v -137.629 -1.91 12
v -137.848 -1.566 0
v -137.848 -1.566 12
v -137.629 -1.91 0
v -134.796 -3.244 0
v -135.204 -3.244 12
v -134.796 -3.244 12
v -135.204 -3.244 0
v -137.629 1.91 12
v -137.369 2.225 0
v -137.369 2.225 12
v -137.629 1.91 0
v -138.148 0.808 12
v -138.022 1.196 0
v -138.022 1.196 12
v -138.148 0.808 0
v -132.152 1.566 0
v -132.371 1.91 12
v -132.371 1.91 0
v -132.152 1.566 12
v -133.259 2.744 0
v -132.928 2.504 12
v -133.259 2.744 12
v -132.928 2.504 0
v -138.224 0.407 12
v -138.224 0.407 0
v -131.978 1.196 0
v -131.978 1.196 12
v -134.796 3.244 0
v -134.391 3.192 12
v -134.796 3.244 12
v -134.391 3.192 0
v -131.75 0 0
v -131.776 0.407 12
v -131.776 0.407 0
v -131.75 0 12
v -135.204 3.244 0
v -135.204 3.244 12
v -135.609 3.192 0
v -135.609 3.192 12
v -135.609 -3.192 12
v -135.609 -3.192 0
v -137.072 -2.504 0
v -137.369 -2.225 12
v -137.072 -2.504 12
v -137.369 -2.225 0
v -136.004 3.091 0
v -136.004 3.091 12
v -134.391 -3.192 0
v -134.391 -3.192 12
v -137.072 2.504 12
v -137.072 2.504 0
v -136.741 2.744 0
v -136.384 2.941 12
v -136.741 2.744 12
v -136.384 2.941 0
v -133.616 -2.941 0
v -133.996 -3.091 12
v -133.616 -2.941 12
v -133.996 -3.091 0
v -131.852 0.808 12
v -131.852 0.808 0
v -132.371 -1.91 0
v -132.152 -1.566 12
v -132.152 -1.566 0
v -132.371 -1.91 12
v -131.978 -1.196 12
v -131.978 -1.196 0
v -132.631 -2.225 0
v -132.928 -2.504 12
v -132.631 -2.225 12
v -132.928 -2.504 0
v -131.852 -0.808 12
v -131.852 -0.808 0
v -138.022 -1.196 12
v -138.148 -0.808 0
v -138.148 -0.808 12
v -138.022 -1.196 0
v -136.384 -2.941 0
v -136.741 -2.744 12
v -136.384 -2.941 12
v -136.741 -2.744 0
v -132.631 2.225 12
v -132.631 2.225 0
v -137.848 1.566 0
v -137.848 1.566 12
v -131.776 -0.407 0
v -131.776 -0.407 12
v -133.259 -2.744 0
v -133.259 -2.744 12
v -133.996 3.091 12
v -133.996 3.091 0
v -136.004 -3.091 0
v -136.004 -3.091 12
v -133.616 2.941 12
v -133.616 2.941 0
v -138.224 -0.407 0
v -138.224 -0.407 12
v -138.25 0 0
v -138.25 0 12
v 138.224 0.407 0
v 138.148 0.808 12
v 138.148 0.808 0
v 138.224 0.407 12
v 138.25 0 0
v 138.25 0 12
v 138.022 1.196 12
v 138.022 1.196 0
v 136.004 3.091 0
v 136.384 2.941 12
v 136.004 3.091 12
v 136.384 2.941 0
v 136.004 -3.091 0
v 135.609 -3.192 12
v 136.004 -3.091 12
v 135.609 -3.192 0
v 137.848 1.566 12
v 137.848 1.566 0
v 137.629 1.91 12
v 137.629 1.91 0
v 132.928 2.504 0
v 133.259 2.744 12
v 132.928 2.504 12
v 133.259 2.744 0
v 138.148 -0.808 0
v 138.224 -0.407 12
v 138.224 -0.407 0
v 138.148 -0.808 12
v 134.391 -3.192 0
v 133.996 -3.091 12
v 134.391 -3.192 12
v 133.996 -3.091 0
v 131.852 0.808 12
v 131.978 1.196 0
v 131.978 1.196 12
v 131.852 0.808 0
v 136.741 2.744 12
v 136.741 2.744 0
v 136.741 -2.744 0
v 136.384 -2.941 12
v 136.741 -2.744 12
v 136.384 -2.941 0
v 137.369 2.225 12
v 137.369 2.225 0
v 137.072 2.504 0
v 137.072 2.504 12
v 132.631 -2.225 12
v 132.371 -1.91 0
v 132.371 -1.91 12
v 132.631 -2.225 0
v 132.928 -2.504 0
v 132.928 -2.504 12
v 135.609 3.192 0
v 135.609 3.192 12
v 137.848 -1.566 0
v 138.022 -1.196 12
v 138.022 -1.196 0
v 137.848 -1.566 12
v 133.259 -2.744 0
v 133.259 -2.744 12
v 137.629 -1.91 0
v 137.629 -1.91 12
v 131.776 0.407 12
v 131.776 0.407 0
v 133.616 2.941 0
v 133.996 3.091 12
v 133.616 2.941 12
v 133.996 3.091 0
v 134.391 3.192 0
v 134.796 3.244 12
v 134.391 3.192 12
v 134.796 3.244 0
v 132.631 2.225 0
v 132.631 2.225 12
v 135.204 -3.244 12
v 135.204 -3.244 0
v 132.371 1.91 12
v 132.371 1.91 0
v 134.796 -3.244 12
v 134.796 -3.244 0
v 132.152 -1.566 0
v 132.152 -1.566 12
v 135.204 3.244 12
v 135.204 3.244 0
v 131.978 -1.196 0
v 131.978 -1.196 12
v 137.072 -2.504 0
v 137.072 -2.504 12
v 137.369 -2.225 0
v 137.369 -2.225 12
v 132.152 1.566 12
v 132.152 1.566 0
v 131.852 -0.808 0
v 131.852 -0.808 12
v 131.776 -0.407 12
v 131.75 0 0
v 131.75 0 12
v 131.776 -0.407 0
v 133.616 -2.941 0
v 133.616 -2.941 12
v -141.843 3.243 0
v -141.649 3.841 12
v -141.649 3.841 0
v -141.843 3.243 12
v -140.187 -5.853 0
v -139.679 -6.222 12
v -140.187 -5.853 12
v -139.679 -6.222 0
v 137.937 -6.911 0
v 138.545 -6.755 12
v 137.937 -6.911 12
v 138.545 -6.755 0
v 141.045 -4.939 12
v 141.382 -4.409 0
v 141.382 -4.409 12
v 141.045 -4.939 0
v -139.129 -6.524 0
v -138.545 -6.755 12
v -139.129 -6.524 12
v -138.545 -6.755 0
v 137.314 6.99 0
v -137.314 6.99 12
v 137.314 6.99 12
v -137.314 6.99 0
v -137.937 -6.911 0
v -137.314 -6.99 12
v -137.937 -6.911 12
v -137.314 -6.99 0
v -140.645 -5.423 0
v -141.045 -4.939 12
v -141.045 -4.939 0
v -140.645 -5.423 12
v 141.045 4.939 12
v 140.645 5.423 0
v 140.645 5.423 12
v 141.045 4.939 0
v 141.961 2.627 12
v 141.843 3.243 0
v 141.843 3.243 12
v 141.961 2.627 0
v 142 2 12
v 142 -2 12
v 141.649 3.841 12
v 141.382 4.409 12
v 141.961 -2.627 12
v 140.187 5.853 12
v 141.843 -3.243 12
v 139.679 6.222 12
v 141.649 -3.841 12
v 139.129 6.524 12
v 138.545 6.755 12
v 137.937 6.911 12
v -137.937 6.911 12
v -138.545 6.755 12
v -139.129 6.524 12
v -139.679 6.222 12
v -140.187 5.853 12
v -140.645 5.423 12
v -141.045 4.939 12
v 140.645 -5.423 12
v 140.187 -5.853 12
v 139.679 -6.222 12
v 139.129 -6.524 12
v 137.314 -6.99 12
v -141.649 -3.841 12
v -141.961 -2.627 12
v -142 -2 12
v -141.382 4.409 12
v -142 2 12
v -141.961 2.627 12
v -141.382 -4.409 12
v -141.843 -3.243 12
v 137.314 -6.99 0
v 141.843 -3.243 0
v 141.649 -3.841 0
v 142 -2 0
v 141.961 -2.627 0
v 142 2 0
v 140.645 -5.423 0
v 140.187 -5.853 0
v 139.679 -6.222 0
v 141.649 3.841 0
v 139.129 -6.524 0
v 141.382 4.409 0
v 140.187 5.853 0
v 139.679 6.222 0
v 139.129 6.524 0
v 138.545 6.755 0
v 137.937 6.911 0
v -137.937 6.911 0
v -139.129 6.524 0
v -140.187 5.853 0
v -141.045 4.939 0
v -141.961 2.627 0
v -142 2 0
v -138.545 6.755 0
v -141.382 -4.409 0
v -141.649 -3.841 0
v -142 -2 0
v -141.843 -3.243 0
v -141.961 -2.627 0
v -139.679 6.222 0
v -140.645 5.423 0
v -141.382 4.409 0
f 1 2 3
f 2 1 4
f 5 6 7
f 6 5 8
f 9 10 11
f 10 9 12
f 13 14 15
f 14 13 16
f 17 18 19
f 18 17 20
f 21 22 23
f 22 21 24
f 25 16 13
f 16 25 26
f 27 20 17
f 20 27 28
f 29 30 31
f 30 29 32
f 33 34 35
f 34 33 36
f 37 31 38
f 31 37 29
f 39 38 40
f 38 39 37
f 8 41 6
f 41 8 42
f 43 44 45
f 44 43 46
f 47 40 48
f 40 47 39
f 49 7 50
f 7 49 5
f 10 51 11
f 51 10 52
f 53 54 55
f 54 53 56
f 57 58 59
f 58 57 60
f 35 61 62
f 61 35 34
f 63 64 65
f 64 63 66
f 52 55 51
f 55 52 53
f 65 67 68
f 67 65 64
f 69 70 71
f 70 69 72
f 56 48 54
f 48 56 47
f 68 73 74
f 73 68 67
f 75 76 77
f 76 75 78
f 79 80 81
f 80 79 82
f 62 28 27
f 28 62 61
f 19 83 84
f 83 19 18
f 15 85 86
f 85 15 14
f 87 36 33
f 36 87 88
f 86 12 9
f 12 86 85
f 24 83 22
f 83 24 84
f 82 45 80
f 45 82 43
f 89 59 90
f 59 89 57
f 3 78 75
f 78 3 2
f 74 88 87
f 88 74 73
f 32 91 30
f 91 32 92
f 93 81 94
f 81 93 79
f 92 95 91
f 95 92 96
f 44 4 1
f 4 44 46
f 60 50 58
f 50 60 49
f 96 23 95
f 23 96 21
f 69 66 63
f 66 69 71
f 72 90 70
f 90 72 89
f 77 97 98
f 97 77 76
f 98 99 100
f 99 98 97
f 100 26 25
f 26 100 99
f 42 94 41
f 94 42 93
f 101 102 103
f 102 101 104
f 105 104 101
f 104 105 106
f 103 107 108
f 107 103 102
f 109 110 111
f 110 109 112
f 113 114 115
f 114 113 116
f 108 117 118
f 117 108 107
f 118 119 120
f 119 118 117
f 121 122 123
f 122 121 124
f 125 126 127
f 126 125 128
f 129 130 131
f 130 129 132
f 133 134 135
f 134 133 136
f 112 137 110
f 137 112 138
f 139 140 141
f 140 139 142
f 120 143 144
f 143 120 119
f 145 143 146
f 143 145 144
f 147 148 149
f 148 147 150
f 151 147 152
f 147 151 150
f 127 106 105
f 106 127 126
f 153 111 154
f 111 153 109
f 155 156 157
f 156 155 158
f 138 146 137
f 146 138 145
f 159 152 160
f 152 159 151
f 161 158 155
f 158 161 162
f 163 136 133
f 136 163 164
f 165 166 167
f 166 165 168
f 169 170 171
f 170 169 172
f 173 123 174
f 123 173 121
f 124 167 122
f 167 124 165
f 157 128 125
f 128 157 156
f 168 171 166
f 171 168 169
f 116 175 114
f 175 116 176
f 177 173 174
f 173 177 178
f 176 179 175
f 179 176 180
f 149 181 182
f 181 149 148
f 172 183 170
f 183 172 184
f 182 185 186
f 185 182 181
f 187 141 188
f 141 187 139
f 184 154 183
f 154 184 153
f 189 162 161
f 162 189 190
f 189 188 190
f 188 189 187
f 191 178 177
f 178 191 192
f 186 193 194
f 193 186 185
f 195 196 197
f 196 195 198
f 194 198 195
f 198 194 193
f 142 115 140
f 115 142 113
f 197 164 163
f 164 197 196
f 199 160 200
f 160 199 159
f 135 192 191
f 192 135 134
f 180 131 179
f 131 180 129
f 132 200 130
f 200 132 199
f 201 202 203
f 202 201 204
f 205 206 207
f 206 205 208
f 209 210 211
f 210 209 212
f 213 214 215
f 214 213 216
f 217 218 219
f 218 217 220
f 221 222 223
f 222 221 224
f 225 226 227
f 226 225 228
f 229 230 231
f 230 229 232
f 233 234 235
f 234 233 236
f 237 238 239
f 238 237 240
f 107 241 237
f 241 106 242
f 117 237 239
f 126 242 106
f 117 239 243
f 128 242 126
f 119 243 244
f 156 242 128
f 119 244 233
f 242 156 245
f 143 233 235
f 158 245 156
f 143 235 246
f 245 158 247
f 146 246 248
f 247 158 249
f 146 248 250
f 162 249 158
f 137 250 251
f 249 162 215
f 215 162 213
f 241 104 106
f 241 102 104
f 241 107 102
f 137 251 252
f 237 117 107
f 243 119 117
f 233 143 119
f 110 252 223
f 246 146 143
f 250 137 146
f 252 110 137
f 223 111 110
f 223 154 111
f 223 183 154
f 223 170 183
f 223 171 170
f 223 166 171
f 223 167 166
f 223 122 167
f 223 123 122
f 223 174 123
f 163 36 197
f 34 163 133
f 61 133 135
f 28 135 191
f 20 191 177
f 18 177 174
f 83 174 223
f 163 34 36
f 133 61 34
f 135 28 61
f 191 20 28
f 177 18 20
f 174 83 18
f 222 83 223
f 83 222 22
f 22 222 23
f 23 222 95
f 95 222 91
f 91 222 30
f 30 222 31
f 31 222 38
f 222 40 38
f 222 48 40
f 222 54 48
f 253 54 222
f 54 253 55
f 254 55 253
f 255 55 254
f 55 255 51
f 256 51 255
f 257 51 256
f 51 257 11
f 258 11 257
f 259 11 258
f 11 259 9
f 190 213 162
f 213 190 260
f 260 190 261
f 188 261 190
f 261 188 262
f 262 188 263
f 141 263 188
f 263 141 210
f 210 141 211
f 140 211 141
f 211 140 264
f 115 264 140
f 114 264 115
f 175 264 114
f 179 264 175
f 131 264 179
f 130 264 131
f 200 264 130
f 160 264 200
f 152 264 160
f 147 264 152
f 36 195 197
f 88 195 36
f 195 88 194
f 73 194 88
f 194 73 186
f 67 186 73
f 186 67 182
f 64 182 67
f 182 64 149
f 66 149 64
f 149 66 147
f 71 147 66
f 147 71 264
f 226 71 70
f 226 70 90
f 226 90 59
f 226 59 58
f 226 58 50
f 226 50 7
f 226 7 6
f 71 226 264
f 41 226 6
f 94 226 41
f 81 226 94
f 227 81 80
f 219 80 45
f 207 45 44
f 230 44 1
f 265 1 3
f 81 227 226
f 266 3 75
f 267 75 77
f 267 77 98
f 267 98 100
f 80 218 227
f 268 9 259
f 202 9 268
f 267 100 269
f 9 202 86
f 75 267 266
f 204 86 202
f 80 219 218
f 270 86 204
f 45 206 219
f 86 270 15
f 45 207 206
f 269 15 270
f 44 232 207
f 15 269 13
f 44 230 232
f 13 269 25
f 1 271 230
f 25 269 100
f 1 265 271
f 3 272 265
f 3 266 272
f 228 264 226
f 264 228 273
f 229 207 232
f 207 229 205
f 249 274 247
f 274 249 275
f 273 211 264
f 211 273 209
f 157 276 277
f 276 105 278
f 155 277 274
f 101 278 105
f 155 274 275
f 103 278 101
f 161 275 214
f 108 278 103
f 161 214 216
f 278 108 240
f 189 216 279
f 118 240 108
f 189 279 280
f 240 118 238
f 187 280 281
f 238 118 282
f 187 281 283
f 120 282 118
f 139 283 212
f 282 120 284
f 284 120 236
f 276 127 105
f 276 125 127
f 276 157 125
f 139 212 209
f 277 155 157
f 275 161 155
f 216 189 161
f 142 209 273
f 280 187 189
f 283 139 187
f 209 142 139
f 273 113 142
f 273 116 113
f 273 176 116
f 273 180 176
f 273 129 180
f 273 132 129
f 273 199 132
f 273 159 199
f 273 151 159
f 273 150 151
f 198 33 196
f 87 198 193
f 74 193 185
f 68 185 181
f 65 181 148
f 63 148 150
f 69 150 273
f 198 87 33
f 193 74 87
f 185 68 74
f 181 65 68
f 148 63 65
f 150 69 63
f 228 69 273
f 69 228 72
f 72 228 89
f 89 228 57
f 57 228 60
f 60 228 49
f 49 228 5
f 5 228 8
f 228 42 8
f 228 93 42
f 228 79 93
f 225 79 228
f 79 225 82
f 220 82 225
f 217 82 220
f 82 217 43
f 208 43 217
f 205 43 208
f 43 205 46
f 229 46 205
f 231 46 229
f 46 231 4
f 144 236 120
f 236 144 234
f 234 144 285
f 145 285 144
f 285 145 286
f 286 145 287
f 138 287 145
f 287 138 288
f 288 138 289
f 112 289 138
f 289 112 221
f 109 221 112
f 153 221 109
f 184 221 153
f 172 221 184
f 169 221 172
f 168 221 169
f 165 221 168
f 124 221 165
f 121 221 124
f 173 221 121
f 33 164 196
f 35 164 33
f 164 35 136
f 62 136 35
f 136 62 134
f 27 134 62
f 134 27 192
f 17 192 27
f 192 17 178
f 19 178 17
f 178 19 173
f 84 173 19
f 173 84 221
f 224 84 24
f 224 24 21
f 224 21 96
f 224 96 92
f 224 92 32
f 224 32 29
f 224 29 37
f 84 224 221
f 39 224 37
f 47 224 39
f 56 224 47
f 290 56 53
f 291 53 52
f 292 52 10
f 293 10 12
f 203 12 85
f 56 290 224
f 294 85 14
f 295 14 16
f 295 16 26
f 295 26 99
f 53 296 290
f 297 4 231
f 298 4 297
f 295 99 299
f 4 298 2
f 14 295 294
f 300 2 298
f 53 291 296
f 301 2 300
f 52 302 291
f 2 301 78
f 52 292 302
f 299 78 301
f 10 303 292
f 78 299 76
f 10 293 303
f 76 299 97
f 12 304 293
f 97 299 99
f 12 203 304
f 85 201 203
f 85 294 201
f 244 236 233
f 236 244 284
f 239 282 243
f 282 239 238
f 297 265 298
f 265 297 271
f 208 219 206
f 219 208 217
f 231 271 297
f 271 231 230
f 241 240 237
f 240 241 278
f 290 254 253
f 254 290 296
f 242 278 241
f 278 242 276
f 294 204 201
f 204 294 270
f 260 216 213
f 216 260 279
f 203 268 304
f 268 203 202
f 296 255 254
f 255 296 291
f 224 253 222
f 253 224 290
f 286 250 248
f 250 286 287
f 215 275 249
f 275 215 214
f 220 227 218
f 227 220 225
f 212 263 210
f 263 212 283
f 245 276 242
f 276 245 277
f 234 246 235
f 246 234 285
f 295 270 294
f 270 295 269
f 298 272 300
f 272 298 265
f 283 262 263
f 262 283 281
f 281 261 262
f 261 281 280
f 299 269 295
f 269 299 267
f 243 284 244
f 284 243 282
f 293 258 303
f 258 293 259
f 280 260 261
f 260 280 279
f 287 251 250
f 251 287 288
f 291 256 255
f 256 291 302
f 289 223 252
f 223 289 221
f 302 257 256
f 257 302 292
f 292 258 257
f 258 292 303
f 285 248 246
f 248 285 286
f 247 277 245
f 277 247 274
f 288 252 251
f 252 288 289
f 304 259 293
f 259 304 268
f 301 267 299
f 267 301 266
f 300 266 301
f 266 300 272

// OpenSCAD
$fn = 50;


difference() {
	union() {
		hull() {
			translate(v = [-137.0000000000, 2.0000000000, 0]) {
				cylinder(h = 12, r = 5);
			}
			translate(v = [137.0000000000, 2.0000000000, 0]) {
				cylinder(h = 12, r = 5);
			}
			translate(v = [-137.0000000000, -2.0000000000, 0]) {
				cylinder(h = 12, r = 5);
			}
			translate(v = [137.0000000000, -2.0000000000, 0]) {
				cylinder(h = 12, r = 5);
			}
		}
	}
	union() {
		translate(v = [-135.0000000000, 0.0000000000, -100.0000000000]) {
			cylinder(h = 200, r = 3.2500000000);
		}
		translate(v = [-135.0000000000, 0.0000000000, -100.0000000000]) {
			cylinder(h = 200, r = 3.2500000000);
		}
		translate(v = [135.0000000000, 0.0000000000, -100.0000000000]) {
			cylinder(h = 200, r = 3.2500000000);
		}
		translate(v = [135.0000000000, 0.0000000000, -100.0000000000]) {
			cylinder(h = 200, r = 3.2500000000);
		}
	}
}
